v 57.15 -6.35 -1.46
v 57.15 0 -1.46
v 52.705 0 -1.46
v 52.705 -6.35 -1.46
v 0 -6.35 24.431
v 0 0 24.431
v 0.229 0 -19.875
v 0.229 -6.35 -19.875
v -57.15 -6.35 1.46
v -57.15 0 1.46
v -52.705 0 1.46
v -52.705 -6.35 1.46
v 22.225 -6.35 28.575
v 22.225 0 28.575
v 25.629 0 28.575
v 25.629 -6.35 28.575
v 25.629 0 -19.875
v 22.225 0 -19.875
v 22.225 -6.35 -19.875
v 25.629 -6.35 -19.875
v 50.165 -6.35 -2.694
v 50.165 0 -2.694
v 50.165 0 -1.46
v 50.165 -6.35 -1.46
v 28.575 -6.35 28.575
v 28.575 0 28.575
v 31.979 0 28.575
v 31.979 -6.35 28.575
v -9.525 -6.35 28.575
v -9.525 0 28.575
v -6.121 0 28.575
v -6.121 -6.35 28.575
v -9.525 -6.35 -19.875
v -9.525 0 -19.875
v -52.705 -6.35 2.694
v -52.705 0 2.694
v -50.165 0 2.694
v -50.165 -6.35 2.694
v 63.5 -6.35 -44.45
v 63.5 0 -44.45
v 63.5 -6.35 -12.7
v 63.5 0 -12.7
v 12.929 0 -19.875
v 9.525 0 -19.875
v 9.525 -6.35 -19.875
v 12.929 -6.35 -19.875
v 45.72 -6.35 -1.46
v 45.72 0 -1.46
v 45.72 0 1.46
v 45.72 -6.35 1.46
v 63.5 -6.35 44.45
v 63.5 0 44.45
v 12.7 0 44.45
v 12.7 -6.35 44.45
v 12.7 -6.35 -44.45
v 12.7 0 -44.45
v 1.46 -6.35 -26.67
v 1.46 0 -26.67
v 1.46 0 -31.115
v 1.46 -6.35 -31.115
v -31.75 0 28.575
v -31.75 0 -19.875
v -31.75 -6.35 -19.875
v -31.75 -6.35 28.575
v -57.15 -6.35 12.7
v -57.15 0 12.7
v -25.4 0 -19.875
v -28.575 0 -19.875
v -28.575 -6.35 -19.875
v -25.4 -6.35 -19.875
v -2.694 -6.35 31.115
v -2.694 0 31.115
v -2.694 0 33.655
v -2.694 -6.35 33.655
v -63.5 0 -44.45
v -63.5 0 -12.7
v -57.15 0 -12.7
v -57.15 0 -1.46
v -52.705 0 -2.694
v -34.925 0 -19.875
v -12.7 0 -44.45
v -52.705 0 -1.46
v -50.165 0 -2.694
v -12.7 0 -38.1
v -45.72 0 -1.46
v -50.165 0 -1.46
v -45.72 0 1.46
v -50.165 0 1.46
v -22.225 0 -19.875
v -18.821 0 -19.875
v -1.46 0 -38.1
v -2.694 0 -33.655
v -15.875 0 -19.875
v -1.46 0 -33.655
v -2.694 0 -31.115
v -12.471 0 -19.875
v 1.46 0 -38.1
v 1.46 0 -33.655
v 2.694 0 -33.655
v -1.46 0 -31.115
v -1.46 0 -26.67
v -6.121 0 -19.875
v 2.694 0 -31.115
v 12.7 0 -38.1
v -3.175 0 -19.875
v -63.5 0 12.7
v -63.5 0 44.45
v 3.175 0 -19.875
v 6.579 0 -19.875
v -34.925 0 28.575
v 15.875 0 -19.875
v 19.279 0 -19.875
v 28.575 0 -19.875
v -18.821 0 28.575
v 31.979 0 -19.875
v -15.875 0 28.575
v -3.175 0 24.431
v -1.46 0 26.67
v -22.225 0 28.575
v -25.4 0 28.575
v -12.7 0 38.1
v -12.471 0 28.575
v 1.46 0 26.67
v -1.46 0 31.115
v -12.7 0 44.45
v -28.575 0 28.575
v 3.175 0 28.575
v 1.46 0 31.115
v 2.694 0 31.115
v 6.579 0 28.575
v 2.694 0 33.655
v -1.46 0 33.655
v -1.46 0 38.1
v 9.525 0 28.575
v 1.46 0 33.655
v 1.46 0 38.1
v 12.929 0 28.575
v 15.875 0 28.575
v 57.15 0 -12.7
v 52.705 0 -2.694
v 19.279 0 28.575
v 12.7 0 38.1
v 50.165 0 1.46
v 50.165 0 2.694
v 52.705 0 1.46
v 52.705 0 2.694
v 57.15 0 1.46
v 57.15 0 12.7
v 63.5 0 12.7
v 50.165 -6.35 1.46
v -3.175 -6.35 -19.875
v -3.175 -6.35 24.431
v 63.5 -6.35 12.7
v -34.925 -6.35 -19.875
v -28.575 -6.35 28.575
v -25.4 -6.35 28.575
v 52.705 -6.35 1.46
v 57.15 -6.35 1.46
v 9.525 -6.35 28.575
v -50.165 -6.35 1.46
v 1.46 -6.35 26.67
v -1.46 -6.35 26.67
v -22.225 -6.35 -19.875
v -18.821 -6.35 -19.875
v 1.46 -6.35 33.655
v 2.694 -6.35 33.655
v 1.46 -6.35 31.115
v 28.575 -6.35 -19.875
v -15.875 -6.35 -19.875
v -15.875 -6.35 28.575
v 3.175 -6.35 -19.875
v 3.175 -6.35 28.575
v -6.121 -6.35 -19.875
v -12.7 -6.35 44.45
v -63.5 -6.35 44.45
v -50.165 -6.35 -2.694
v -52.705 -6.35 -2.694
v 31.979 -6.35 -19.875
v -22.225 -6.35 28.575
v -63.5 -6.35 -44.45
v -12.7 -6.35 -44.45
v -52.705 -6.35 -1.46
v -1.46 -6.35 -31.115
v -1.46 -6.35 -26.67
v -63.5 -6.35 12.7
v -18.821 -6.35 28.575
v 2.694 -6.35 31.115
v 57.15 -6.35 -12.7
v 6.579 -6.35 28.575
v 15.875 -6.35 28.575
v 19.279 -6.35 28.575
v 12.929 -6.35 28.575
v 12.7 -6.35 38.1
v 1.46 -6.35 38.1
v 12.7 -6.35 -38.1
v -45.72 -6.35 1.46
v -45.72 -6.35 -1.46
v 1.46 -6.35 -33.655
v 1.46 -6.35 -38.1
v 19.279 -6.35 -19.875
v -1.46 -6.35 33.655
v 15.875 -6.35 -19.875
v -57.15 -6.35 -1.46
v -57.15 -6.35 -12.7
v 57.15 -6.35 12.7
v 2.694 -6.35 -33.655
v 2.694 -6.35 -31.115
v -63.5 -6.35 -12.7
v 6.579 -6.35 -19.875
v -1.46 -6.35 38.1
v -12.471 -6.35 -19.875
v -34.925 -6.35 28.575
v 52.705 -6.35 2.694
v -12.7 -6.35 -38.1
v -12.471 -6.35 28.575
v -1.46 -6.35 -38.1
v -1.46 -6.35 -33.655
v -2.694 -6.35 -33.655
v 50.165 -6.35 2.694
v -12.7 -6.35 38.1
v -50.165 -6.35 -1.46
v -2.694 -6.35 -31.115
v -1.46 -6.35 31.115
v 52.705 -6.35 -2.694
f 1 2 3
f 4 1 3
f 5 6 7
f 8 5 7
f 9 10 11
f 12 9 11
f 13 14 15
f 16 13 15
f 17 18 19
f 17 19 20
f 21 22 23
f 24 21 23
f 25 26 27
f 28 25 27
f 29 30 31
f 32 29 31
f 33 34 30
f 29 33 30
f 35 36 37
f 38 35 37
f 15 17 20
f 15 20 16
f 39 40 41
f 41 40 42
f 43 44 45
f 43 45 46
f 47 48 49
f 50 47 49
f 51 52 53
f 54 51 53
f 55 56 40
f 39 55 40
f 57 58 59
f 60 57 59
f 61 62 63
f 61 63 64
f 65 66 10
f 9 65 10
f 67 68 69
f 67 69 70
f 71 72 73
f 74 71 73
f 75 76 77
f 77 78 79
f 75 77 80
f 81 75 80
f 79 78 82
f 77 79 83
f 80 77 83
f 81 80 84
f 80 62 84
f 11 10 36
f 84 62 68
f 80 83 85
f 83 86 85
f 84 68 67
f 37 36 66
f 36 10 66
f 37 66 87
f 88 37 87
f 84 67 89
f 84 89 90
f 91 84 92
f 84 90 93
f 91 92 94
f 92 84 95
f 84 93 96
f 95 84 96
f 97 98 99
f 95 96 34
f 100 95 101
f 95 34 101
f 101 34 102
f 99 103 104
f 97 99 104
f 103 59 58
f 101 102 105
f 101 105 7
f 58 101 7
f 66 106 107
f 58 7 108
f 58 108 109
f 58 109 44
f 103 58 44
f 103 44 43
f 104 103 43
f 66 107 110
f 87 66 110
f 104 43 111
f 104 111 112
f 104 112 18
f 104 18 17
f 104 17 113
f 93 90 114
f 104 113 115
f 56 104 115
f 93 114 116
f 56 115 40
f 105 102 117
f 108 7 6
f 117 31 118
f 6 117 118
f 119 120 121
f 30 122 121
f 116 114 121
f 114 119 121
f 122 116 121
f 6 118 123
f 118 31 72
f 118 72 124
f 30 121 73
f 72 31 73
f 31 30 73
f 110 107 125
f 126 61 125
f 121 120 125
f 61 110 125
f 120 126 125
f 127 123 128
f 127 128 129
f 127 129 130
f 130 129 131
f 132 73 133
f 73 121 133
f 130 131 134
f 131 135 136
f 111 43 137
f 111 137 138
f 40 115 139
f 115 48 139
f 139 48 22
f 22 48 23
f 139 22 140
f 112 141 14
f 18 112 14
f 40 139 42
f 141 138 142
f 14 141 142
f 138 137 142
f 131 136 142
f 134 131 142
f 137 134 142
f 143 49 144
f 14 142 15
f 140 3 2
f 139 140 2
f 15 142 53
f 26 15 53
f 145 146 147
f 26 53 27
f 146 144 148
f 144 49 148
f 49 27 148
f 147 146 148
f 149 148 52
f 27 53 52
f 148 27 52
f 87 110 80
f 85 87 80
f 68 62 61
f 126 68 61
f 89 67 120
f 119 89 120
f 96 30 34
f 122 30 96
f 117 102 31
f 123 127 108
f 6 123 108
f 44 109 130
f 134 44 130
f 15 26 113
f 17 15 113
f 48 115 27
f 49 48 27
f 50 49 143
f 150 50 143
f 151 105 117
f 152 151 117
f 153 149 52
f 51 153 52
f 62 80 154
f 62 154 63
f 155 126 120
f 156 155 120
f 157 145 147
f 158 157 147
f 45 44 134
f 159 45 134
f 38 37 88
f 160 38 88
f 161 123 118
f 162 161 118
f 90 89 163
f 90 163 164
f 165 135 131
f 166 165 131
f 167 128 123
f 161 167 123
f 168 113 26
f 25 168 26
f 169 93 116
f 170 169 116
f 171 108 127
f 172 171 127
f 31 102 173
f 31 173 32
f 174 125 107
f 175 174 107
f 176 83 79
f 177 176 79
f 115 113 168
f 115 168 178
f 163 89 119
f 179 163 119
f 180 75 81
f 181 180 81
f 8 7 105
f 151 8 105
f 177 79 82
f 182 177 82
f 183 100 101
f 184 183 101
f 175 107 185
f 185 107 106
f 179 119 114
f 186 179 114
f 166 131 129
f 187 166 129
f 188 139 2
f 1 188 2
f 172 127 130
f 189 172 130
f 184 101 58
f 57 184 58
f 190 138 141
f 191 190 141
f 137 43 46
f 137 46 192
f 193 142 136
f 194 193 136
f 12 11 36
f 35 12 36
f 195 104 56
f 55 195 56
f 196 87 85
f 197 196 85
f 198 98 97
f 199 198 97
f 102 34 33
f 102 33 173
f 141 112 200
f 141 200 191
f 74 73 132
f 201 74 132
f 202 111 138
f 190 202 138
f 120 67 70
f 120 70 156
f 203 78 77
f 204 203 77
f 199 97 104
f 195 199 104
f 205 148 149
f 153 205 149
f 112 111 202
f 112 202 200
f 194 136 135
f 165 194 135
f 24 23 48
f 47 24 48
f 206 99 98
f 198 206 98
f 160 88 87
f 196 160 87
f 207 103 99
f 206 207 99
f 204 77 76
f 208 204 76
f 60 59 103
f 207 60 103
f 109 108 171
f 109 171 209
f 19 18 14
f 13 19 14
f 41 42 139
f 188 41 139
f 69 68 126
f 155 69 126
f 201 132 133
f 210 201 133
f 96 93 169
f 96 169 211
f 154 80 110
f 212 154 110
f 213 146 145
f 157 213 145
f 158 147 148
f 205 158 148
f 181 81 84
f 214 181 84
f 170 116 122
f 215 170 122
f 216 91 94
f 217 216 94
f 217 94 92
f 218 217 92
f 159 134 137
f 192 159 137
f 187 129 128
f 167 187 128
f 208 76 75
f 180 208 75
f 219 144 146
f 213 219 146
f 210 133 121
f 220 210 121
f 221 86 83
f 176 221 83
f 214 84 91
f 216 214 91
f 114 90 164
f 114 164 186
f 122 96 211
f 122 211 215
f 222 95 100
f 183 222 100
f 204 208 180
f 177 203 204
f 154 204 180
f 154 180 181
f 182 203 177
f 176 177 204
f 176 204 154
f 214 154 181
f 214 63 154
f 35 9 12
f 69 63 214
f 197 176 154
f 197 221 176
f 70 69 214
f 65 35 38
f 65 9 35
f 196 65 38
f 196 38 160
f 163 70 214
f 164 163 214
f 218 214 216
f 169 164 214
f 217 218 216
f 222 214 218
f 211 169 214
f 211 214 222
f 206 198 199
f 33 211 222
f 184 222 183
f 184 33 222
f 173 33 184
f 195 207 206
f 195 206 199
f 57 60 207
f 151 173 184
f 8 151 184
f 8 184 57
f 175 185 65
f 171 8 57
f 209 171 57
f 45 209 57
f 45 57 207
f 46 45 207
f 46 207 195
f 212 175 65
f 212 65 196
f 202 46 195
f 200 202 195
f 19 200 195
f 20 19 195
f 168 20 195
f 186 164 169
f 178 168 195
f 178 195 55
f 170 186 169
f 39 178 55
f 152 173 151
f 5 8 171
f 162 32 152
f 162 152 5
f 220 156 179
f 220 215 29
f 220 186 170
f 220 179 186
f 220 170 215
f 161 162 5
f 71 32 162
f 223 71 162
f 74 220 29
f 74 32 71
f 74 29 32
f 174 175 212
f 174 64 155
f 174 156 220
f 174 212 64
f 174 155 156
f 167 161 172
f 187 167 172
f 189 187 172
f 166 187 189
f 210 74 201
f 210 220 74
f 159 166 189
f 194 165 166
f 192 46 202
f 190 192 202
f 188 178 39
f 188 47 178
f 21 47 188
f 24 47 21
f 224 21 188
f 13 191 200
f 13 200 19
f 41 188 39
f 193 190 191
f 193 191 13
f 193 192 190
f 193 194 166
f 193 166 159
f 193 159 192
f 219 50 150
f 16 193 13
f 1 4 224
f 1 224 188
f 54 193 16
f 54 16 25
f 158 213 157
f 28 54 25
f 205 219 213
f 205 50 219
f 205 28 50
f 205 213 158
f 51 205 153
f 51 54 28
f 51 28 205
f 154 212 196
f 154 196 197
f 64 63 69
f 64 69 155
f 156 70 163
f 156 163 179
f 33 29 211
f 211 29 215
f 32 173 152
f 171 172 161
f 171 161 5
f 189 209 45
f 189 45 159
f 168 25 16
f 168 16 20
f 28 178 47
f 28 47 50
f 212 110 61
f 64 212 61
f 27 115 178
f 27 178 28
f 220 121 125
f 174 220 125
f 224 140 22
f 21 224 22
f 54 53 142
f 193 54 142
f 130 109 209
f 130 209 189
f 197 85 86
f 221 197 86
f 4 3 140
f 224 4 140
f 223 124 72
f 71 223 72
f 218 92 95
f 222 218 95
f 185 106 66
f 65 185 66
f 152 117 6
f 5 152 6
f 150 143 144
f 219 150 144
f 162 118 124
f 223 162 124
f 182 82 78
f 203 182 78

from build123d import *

# Parameters (mm, degrees)
F0_W     = 3.175
F0_H     = 48.4495080546
F0_W_2   = 3.4043772995
F1_DEPTH = 6.35


# Not quite as in the source:
# - a feature names something its author has since deleted; it is built from what else it names


with BuildPart() as f1:
    # F0 (on Front) → F1 (new body)
    with BuildSketch(Plane.XZ):
        Polygon((12.7, -44.45), (57.1500004709, -44.45), (63.5, -44.45), (63.5, -12.7), (57.1500004709, -12.7), (57.1500004709, -1.4605), (52.7050002354, -1.4605), (52.7050002354, -2.69367), (50.1650002354, -2.69367), (50.1650002354, -1.4605), (45.72, -1.4605), (45.72, 1.4605), (50.1650002354, 1.4605), (50.1650002354, 2.69367), (52.7050002354, 2.69367), (52.7050002354, 1.4605), (57.1500004709, 1.4605), (57.1500004709, 12.7), (63.5, 12.7), (63.5, 44.45), (57.1500004709, 44.45), (12.7, 44.45), (12.7, 38.1000004709), (1.4605, 38.1000004709), (1.4605, 33.6550002354), (2.69367, 33.6550002354), (2.69367, 31.1150002354), (1.4605, 31.1150002354), (1.4605, 26.67), (-1.4605, 26.67), (-1.4605, 31.1150002354), (-2.69367, 31.1150002354), (-2.69367, 33.6550002354), (-1.4605, 33.6550002354), (-1.4605, 38.1000004709), (-12.7, 38.1000004709), (-12.7, 44.45), (-57.1500004709, 44.45), (-63.5, 44.45), (-63.5, 12.7), (-57.1500004709, 12.7), (-57.1500004709, 1.4605), (-52.7050002354, 1.4605), (-52.7050002354, 2.69367), (-50.1650002354, 2.69367), (-50.1650002354, 1.4605), (-45.72, 1.4605), (-45.72, -1.4605), (-50.1650002354, -1.4605), (-50.1650002354, -2.69367), (-52.7050002354, -2.69367), (-52.7050002354, -1.4605), (-57.1500004709, -1.4605), (-57.1500004709, -2.69367), (-57.1500004709, -12.7), (-63.5, -12.7), (-63.5, -44.45), (-57.1500004709, -44.45), (-12.7, -44.45), (-12.7, -38.1000004709), (-1.4605, -38.1000004709), (-1.4605, -33.6550002354), (-2.69367, -33.6550002354), (-2.69367, -31.1150002354), (-1.4605, -31.1150002354), (-1.4605, -26.67), (1.4605, -26.67), (1.4605, -31.1150002354), (2.69367, -31.1150002354), (2.69367, -33.6550002354), (1.4605, -33.6550002354), (1.4605, -38.1000004709), (12.7, -38.1000004709), align=None)
        with Locations((-33.3375002354, 4.3502459727)):
            Rectangle(F0_W, F0_H, mode=Mode.SUBTRACT)
        with Locations((-26.9875002354, 4.3502459727)):
            Rectangle(F0_W, F0_H, mode=Mode.SUBTRACT)
        with Locations((-20.5228115857, 4.3502459727)):
            Rectangle(F0_W_2, F0_H, mode=Mode.SUBTRACT)
        with Locations((-14.1728115857, 4.3502459727)):
            Rectangle(F0_W_2, F0_H, mode=Mode.SUBTRACT)
        Polygon((0.2293770641, -19.8745080546), (-3.1750002354, -19.8745080546), (-3.1750002354, 24.4311112911), (0, 24.4311112911), align=None, mode=Mode.SUBTRACT)
        with Locations((-7.8228115857, 4.3502459727)):
            Rectangle(F0_W_2, F0_H, mode=Mode.SUBTRACT)
        with Locations((4.8771884143, 4.3502459727)):
            Rectangle(F0_W_2, F0_H, mode=Mode.SUBTRACT)
        with Locations((11.2271884143, 4.3502459727)):
            Rectangle(F0_W_2, F0_H, mode=Mode.SUBTRACT)
        with Locations((17.5771884143, 4.3502459727)):
            Rectangle(F0_W_2, F0_H, mode=Mode.SUBTRACT)
        with Locations((23.9271884143, 4.3502459727)):
            Rectangle(F0_W_2, F0_H, mode=Mode.SUBTRACT)
        with Locations((30.2771884143, 4.3502459727)):
            Rectangle(F0_W_2, F0_H, mode=Mode.SUBTRACT)
    extrude(amount=F1_DEPTH)


solid = f1.part
